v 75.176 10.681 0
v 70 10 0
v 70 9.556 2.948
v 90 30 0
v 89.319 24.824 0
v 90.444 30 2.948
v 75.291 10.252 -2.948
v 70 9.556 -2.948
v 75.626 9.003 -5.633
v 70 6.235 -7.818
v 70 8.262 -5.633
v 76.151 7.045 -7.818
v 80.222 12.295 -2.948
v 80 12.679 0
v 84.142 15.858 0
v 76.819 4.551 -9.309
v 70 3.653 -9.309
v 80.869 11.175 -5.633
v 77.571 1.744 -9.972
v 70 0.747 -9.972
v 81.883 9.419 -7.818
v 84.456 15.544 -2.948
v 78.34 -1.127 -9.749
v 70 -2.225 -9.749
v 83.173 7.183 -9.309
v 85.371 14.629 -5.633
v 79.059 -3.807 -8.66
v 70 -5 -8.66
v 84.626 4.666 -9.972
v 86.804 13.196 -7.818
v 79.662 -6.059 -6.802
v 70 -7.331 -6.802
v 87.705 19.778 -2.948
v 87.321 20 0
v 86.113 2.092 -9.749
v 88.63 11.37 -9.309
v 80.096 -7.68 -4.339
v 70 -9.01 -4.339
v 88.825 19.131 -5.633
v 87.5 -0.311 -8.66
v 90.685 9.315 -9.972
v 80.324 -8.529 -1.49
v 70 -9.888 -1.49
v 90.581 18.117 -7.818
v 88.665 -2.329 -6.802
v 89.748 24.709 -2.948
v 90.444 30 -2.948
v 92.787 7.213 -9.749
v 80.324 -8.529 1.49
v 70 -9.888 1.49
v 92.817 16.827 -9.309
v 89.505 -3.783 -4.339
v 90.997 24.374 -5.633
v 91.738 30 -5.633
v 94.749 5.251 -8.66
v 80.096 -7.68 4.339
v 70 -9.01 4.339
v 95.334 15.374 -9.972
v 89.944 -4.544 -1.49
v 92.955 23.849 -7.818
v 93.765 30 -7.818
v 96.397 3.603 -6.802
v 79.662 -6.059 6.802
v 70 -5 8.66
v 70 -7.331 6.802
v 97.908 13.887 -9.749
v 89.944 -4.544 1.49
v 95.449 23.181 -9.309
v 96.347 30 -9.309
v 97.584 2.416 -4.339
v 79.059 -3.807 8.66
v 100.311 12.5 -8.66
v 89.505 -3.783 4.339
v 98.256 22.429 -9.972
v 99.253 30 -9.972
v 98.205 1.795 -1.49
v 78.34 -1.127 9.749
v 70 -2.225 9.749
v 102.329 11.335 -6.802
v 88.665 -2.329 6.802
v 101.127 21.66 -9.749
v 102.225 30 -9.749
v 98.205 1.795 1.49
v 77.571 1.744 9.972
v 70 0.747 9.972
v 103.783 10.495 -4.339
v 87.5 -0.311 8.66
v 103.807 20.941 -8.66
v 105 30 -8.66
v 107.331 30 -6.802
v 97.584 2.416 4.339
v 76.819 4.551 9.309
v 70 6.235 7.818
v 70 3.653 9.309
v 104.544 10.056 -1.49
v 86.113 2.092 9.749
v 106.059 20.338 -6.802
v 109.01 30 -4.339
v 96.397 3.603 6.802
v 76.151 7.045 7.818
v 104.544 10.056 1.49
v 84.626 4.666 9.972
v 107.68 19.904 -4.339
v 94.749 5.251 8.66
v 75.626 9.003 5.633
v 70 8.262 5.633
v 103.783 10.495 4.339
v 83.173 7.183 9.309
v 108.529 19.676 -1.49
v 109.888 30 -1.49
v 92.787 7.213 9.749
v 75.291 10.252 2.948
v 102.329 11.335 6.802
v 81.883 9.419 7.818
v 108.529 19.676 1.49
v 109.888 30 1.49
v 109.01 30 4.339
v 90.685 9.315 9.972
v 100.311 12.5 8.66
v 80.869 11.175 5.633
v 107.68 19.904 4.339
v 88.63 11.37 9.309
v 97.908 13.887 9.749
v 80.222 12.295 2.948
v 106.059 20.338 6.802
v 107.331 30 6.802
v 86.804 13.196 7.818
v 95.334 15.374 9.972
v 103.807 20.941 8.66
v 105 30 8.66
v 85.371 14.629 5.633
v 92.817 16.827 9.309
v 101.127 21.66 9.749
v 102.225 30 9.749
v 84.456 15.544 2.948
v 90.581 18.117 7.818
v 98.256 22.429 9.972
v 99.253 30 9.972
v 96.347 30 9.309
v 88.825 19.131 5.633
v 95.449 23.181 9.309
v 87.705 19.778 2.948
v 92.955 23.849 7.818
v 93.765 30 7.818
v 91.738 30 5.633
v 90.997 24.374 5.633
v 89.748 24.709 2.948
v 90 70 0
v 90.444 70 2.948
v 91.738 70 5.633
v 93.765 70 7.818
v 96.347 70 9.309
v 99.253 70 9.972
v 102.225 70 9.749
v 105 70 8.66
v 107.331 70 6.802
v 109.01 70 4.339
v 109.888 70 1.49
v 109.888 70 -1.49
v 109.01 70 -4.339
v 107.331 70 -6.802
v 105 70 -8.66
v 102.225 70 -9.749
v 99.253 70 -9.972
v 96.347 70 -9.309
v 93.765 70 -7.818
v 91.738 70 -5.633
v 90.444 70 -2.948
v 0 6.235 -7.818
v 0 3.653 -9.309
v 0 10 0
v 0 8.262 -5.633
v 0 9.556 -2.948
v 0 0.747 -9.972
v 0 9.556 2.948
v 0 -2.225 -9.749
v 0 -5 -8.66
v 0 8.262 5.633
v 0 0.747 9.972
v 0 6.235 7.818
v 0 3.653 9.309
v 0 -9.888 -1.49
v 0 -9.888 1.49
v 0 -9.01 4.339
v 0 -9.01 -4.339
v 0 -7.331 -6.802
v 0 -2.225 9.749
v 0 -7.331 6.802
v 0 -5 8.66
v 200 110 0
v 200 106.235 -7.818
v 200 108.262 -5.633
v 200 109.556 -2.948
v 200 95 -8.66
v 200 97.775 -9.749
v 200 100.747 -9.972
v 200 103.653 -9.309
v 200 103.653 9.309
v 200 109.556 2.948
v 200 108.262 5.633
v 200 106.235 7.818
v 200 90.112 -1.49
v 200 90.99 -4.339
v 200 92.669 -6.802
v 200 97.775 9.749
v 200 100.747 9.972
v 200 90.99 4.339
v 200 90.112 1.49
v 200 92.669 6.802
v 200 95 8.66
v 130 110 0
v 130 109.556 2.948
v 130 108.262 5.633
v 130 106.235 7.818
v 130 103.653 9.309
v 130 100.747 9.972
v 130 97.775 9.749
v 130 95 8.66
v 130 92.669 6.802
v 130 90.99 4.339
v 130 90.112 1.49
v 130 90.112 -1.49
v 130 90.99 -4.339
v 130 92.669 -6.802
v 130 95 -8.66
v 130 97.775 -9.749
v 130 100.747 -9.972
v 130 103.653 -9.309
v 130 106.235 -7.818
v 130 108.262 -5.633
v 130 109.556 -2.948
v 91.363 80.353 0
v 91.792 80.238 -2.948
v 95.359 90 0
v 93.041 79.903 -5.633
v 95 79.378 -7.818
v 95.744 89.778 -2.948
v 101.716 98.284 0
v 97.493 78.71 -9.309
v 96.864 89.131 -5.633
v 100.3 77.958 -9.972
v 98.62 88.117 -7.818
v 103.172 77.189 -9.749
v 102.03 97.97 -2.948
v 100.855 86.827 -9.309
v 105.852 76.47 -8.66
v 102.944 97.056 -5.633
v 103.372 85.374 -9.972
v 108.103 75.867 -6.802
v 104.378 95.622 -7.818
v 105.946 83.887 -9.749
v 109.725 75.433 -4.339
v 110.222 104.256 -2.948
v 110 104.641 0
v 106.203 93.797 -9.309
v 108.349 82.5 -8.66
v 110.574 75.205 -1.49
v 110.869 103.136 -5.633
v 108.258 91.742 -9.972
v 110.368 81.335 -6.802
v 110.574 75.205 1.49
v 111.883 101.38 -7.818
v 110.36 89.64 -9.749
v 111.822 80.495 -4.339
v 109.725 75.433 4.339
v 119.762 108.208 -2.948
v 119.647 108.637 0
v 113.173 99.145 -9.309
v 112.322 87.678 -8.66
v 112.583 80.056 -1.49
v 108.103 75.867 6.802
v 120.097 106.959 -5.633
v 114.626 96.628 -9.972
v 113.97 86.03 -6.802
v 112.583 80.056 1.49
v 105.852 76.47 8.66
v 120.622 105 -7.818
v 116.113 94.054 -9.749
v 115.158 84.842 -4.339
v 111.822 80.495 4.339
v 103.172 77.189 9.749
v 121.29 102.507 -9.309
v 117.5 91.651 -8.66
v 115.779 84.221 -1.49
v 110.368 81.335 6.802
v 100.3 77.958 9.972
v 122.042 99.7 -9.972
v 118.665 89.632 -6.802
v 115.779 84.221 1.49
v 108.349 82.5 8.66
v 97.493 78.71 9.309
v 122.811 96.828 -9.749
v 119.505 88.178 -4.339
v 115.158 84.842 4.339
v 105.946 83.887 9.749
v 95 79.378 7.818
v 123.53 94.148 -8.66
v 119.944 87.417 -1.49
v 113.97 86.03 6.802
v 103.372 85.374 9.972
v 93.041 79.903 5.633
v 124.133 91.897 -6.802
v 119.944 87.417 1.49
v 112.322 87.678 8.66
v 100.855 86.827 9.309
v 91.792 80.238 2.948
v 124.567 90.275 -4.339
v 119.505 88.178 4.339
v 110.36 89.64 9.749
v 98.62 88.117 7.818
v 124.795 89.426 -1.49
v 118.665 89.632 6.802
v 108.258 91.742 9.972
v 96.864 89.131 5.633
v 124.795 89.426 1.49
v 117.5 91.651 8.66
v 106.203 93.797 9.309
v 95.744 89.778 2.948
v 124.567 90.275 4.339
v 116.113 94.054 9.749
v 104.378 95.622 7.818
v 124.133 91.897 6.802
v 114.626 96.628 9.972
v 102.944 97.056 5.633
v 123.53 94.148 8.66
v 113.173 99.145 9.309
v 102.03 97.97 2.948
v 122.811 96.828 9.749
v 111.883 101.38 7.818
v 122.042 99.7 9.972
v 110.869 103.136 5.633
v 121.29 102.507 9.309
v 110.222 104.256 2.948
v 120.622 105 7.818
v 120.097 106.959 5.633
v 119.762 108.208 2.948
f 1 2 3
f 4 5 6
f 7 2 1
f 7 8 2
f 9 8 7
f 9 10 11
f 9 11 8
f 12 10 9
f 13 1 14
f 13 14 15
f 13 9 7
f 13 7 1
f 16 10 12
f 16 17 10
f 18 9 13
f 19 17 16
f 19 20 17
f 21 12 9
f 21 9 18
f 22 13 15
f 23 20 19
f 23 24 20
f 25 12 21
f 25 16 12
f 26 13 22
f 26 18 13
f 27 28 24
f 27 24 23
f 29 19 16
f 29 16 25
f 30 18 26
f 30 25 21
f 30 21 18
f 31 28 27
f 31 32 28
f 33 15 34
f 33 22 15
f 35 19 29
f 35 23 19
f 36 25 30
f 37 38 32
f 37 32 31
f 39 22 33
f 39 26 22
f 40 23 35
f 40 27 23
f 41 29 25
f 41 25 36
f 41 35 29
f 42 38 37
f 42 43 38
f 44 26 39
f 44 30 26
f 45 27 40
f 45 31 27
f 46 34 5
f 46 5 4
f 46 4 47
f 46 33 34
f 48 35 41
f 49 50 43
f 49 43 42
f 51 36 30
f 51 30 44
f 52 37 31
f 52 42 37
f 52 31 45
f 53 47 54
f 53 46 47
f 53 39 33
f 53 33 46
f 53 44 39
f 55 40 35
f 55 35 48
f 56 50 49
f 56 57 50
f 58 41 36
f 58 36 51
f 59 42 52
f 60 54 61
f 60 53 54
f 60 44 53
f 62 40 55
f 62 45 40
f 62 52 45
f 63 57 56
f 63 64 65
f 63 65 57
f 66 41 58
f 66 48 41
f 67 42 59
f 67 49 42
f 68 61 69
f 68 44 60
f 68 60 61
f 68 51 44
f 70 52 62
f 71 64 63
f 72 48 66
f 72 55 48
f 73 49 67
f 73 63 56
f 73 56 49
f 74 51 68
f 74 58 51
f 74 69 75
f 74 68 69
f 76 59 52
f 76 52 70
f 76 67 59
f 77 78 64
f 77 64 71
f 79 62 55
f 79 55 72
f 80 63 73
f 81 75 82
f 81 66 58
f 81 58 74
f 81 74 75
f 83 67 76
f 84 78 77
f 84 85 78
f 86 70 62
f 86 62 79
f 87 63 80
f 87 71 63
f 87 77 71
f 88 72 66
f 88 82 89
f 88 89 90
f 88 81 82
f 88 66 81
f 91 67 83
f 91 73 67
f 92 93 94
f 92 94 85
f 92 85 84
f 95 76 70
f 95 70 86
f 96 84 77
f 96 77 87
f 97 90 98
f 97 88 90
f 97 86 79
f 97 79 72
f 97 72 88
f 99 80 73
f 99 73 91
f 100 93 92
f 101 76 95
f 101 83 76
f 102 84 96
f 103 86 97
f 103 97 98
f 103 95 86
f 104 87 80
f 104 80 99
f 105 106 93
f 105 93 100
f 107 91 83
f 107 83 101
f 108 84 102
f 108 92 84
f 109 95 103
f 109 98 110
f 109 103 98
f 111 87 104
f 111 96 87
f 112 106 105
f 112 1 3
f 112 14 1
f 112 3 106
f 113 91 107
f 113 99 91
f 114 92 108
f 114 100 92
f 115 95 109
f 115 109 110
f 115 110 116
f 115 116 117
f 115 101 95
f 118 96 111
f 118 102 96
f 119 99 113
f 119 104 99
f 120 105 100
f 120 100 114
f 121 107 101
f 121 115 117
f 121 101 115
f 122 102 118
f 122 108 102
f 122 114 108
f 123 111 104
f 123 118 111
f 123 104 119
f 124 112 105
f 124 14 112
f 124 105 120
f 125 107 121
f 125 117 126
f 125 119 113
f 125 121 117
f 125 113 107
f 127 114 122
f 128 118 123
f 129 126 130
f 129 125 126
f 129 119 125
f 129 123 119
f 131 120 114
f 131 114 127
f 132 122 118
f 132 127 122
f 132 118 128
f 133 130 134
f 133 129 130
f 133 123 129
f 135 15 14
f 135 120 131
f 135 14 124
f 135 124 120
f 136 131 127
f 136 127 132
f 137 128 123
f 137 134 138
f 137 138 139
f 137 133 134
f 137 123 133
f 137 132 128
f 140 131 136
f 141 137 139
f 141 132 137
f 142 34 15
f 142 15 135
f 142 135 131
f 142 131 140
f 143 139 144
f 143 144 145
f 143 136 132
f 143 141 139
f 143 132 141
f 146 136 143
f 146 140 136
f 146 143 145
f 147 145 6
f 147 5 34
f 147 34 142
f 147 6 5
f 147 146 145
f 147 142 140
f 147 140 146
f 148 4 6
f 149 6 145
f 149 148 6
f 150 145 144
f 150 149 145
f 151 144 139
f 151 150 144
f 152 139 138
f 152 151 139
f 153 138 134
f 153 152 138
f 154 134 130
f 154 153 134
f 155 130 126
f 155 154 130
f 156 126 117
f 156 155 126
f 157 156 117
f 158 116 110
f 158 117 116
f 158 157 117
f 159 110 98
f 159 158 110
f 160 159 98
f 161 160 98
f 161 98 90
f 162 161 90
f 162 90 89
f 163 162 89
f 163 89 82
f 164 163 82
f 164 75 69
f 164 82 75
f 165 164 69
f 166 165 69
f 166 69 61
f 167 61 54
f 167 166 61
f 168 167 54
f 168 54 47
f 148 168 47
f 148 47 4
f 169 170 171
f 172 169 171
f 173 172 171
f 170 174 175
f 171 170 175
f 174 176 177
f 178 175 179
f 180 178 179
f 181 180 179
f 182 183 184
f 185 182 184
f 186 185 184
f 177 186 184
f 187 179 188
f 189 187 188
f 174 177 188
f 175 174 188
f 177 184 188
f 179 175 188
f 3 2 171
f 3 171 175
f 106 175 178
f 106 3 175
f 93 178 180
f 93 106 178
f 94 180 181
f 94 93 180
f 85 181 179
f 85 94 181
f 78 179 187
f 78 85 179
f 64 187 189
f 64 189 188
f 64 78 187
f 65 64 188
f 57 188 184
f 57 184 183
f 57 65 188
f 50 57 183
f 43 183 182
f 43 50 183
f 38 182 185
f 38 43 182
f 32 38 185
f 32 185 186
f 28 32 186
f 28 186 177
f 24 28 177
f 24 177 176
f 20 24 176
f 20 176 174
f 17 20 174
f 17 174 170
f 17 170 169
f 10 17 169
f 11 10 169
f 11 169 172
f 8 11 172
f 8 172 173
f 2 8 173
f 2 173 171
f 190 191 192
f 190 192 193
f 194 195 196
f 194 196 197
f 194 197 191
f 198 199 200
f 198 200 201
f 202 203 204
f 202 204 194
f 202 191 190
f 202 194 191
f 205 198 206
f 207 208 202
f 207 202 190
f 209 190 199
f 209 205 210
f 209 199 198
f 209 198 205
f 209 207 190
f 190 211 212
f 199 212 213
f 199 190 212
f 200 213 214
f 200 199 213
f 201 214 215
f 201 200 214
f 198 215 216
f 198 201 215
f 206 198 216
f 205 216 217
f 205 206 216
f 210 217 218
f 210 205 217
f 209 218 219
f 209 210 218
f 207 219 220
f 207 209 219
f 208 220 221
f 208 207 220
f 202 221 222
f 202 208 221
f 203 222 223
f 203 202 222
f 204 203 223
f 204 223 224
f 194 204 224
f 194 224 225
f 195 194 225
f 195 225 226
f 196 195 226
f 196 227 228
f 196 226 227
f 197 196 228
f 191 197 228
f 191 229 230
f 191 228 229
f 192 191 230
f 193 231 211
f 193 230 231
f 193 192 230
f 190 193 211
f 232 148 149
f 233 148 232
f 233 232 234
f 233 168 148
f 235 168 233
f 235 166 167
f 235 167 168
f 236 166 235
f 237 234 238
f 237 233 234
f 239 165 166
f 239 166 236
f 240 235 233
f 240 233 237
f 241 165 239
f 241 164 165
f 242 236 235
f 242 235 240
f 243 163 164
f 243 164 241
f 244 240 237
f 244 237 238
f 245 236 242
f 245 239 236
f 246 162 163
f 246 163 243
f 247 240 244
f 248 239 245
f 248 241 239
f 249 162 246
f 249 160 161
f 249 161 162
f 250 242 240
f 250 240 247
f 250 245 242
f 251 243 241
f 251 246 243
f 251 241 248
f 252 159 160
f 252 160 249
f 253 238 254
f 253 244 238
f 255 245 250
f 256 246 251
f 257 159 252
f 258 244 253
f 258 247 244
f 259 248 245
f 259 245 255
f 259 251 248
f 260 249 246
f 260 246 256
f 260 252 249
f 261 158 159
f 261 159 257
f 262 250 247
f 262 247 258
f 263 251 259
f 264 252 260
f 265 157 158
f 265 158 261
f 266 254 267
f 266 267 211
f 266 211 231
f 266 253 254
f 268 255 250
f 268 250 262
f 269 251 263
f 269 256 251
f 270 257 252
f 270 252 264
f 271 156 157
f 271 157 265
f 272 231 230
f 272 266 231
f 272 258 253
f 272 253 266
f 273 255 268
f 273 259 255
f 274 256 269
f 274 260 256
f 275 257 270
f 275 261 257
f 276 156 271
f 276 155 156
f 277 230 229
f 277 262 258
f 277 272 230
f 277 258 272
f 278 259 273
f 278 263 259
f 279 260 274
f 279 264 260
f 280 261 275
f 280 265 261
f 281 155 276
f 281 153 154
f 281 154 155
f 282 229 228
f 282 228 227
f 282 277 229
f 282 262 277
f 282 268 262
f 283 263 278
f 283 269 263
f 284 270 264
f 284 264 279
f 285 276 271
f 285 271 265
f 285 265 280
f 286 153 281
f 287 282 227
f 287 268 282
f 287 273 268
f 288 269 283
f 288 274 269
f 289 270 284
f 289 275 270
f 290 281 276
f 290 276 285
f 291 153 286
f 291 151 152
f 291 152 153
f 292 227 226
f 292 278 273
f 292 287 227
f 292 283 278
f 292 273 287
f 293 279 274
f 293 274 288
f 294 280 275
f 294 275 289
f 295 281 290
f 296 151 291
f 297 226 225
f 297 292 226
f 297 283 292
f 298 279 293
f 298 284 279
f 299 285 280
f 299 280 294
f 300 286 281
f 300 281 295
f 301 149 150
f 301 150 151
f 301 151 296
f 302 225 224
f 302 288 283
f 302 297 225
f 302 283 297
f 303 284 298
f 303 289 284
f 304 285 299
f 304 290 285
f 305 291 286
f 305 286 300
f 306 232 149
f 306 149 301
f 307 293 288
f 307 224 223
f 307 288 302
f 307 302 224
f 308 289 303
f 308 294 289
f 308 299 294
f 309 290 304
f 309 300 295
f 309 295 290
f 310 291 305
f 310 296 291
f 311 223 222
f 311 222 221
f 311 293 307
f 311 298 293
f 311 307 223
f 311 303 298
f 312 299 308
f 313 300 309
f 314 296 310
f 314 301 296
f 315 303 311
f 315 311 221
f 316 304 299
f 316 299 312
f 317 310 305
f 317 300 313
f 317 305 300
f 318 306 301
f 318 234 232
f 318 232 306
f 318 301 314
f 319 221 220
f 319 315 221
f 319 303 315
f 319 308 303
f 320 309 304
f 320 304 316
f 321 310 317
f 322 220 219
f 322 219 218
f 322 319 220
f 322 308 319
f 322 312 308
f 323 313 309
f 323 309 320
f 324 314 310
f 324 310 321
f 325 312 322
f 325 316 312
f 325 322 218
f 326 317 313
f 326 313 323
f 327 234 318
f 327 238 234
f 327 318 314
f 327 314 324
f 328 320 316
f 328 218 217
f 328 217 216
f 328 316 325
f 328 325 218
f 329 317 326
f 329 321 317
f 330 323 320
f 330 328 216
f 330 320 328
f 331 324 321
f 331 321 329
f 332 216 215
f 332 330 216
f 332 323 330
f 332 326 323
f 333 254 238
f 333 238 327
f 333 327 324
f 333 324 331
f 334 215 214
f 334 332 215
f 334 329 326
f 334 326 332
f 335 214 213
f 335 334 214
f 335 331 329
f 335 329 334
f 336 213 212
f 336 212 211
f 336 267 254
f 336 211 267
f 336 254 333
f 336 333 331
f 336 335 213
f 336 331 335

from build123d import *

# Parameters (mm, degrees)
F1_R = 10


with BuildPart() as f2:
    # F2: sweep along a path in F0
    with BuildLine(Plane.XY) as f2_path:
        Line((0, 0), (70, 0))
        ThreePointArc((70, 0), (91.2132034356, 8.7867965644), (100, 30))
        Line((100, 30), (100, 70))
        ThreePointArc((100, 70), (108.7867965644, 91.2132034356), (130, 100))
        Line((130, 100), (200, 100))
    # F1 (on Right) → F2 (sweep)
    with BuildSketch(Plane.YZ):
        Circle(F1_R)
    sweep(path=f2_path.line)


solid = f2.part
